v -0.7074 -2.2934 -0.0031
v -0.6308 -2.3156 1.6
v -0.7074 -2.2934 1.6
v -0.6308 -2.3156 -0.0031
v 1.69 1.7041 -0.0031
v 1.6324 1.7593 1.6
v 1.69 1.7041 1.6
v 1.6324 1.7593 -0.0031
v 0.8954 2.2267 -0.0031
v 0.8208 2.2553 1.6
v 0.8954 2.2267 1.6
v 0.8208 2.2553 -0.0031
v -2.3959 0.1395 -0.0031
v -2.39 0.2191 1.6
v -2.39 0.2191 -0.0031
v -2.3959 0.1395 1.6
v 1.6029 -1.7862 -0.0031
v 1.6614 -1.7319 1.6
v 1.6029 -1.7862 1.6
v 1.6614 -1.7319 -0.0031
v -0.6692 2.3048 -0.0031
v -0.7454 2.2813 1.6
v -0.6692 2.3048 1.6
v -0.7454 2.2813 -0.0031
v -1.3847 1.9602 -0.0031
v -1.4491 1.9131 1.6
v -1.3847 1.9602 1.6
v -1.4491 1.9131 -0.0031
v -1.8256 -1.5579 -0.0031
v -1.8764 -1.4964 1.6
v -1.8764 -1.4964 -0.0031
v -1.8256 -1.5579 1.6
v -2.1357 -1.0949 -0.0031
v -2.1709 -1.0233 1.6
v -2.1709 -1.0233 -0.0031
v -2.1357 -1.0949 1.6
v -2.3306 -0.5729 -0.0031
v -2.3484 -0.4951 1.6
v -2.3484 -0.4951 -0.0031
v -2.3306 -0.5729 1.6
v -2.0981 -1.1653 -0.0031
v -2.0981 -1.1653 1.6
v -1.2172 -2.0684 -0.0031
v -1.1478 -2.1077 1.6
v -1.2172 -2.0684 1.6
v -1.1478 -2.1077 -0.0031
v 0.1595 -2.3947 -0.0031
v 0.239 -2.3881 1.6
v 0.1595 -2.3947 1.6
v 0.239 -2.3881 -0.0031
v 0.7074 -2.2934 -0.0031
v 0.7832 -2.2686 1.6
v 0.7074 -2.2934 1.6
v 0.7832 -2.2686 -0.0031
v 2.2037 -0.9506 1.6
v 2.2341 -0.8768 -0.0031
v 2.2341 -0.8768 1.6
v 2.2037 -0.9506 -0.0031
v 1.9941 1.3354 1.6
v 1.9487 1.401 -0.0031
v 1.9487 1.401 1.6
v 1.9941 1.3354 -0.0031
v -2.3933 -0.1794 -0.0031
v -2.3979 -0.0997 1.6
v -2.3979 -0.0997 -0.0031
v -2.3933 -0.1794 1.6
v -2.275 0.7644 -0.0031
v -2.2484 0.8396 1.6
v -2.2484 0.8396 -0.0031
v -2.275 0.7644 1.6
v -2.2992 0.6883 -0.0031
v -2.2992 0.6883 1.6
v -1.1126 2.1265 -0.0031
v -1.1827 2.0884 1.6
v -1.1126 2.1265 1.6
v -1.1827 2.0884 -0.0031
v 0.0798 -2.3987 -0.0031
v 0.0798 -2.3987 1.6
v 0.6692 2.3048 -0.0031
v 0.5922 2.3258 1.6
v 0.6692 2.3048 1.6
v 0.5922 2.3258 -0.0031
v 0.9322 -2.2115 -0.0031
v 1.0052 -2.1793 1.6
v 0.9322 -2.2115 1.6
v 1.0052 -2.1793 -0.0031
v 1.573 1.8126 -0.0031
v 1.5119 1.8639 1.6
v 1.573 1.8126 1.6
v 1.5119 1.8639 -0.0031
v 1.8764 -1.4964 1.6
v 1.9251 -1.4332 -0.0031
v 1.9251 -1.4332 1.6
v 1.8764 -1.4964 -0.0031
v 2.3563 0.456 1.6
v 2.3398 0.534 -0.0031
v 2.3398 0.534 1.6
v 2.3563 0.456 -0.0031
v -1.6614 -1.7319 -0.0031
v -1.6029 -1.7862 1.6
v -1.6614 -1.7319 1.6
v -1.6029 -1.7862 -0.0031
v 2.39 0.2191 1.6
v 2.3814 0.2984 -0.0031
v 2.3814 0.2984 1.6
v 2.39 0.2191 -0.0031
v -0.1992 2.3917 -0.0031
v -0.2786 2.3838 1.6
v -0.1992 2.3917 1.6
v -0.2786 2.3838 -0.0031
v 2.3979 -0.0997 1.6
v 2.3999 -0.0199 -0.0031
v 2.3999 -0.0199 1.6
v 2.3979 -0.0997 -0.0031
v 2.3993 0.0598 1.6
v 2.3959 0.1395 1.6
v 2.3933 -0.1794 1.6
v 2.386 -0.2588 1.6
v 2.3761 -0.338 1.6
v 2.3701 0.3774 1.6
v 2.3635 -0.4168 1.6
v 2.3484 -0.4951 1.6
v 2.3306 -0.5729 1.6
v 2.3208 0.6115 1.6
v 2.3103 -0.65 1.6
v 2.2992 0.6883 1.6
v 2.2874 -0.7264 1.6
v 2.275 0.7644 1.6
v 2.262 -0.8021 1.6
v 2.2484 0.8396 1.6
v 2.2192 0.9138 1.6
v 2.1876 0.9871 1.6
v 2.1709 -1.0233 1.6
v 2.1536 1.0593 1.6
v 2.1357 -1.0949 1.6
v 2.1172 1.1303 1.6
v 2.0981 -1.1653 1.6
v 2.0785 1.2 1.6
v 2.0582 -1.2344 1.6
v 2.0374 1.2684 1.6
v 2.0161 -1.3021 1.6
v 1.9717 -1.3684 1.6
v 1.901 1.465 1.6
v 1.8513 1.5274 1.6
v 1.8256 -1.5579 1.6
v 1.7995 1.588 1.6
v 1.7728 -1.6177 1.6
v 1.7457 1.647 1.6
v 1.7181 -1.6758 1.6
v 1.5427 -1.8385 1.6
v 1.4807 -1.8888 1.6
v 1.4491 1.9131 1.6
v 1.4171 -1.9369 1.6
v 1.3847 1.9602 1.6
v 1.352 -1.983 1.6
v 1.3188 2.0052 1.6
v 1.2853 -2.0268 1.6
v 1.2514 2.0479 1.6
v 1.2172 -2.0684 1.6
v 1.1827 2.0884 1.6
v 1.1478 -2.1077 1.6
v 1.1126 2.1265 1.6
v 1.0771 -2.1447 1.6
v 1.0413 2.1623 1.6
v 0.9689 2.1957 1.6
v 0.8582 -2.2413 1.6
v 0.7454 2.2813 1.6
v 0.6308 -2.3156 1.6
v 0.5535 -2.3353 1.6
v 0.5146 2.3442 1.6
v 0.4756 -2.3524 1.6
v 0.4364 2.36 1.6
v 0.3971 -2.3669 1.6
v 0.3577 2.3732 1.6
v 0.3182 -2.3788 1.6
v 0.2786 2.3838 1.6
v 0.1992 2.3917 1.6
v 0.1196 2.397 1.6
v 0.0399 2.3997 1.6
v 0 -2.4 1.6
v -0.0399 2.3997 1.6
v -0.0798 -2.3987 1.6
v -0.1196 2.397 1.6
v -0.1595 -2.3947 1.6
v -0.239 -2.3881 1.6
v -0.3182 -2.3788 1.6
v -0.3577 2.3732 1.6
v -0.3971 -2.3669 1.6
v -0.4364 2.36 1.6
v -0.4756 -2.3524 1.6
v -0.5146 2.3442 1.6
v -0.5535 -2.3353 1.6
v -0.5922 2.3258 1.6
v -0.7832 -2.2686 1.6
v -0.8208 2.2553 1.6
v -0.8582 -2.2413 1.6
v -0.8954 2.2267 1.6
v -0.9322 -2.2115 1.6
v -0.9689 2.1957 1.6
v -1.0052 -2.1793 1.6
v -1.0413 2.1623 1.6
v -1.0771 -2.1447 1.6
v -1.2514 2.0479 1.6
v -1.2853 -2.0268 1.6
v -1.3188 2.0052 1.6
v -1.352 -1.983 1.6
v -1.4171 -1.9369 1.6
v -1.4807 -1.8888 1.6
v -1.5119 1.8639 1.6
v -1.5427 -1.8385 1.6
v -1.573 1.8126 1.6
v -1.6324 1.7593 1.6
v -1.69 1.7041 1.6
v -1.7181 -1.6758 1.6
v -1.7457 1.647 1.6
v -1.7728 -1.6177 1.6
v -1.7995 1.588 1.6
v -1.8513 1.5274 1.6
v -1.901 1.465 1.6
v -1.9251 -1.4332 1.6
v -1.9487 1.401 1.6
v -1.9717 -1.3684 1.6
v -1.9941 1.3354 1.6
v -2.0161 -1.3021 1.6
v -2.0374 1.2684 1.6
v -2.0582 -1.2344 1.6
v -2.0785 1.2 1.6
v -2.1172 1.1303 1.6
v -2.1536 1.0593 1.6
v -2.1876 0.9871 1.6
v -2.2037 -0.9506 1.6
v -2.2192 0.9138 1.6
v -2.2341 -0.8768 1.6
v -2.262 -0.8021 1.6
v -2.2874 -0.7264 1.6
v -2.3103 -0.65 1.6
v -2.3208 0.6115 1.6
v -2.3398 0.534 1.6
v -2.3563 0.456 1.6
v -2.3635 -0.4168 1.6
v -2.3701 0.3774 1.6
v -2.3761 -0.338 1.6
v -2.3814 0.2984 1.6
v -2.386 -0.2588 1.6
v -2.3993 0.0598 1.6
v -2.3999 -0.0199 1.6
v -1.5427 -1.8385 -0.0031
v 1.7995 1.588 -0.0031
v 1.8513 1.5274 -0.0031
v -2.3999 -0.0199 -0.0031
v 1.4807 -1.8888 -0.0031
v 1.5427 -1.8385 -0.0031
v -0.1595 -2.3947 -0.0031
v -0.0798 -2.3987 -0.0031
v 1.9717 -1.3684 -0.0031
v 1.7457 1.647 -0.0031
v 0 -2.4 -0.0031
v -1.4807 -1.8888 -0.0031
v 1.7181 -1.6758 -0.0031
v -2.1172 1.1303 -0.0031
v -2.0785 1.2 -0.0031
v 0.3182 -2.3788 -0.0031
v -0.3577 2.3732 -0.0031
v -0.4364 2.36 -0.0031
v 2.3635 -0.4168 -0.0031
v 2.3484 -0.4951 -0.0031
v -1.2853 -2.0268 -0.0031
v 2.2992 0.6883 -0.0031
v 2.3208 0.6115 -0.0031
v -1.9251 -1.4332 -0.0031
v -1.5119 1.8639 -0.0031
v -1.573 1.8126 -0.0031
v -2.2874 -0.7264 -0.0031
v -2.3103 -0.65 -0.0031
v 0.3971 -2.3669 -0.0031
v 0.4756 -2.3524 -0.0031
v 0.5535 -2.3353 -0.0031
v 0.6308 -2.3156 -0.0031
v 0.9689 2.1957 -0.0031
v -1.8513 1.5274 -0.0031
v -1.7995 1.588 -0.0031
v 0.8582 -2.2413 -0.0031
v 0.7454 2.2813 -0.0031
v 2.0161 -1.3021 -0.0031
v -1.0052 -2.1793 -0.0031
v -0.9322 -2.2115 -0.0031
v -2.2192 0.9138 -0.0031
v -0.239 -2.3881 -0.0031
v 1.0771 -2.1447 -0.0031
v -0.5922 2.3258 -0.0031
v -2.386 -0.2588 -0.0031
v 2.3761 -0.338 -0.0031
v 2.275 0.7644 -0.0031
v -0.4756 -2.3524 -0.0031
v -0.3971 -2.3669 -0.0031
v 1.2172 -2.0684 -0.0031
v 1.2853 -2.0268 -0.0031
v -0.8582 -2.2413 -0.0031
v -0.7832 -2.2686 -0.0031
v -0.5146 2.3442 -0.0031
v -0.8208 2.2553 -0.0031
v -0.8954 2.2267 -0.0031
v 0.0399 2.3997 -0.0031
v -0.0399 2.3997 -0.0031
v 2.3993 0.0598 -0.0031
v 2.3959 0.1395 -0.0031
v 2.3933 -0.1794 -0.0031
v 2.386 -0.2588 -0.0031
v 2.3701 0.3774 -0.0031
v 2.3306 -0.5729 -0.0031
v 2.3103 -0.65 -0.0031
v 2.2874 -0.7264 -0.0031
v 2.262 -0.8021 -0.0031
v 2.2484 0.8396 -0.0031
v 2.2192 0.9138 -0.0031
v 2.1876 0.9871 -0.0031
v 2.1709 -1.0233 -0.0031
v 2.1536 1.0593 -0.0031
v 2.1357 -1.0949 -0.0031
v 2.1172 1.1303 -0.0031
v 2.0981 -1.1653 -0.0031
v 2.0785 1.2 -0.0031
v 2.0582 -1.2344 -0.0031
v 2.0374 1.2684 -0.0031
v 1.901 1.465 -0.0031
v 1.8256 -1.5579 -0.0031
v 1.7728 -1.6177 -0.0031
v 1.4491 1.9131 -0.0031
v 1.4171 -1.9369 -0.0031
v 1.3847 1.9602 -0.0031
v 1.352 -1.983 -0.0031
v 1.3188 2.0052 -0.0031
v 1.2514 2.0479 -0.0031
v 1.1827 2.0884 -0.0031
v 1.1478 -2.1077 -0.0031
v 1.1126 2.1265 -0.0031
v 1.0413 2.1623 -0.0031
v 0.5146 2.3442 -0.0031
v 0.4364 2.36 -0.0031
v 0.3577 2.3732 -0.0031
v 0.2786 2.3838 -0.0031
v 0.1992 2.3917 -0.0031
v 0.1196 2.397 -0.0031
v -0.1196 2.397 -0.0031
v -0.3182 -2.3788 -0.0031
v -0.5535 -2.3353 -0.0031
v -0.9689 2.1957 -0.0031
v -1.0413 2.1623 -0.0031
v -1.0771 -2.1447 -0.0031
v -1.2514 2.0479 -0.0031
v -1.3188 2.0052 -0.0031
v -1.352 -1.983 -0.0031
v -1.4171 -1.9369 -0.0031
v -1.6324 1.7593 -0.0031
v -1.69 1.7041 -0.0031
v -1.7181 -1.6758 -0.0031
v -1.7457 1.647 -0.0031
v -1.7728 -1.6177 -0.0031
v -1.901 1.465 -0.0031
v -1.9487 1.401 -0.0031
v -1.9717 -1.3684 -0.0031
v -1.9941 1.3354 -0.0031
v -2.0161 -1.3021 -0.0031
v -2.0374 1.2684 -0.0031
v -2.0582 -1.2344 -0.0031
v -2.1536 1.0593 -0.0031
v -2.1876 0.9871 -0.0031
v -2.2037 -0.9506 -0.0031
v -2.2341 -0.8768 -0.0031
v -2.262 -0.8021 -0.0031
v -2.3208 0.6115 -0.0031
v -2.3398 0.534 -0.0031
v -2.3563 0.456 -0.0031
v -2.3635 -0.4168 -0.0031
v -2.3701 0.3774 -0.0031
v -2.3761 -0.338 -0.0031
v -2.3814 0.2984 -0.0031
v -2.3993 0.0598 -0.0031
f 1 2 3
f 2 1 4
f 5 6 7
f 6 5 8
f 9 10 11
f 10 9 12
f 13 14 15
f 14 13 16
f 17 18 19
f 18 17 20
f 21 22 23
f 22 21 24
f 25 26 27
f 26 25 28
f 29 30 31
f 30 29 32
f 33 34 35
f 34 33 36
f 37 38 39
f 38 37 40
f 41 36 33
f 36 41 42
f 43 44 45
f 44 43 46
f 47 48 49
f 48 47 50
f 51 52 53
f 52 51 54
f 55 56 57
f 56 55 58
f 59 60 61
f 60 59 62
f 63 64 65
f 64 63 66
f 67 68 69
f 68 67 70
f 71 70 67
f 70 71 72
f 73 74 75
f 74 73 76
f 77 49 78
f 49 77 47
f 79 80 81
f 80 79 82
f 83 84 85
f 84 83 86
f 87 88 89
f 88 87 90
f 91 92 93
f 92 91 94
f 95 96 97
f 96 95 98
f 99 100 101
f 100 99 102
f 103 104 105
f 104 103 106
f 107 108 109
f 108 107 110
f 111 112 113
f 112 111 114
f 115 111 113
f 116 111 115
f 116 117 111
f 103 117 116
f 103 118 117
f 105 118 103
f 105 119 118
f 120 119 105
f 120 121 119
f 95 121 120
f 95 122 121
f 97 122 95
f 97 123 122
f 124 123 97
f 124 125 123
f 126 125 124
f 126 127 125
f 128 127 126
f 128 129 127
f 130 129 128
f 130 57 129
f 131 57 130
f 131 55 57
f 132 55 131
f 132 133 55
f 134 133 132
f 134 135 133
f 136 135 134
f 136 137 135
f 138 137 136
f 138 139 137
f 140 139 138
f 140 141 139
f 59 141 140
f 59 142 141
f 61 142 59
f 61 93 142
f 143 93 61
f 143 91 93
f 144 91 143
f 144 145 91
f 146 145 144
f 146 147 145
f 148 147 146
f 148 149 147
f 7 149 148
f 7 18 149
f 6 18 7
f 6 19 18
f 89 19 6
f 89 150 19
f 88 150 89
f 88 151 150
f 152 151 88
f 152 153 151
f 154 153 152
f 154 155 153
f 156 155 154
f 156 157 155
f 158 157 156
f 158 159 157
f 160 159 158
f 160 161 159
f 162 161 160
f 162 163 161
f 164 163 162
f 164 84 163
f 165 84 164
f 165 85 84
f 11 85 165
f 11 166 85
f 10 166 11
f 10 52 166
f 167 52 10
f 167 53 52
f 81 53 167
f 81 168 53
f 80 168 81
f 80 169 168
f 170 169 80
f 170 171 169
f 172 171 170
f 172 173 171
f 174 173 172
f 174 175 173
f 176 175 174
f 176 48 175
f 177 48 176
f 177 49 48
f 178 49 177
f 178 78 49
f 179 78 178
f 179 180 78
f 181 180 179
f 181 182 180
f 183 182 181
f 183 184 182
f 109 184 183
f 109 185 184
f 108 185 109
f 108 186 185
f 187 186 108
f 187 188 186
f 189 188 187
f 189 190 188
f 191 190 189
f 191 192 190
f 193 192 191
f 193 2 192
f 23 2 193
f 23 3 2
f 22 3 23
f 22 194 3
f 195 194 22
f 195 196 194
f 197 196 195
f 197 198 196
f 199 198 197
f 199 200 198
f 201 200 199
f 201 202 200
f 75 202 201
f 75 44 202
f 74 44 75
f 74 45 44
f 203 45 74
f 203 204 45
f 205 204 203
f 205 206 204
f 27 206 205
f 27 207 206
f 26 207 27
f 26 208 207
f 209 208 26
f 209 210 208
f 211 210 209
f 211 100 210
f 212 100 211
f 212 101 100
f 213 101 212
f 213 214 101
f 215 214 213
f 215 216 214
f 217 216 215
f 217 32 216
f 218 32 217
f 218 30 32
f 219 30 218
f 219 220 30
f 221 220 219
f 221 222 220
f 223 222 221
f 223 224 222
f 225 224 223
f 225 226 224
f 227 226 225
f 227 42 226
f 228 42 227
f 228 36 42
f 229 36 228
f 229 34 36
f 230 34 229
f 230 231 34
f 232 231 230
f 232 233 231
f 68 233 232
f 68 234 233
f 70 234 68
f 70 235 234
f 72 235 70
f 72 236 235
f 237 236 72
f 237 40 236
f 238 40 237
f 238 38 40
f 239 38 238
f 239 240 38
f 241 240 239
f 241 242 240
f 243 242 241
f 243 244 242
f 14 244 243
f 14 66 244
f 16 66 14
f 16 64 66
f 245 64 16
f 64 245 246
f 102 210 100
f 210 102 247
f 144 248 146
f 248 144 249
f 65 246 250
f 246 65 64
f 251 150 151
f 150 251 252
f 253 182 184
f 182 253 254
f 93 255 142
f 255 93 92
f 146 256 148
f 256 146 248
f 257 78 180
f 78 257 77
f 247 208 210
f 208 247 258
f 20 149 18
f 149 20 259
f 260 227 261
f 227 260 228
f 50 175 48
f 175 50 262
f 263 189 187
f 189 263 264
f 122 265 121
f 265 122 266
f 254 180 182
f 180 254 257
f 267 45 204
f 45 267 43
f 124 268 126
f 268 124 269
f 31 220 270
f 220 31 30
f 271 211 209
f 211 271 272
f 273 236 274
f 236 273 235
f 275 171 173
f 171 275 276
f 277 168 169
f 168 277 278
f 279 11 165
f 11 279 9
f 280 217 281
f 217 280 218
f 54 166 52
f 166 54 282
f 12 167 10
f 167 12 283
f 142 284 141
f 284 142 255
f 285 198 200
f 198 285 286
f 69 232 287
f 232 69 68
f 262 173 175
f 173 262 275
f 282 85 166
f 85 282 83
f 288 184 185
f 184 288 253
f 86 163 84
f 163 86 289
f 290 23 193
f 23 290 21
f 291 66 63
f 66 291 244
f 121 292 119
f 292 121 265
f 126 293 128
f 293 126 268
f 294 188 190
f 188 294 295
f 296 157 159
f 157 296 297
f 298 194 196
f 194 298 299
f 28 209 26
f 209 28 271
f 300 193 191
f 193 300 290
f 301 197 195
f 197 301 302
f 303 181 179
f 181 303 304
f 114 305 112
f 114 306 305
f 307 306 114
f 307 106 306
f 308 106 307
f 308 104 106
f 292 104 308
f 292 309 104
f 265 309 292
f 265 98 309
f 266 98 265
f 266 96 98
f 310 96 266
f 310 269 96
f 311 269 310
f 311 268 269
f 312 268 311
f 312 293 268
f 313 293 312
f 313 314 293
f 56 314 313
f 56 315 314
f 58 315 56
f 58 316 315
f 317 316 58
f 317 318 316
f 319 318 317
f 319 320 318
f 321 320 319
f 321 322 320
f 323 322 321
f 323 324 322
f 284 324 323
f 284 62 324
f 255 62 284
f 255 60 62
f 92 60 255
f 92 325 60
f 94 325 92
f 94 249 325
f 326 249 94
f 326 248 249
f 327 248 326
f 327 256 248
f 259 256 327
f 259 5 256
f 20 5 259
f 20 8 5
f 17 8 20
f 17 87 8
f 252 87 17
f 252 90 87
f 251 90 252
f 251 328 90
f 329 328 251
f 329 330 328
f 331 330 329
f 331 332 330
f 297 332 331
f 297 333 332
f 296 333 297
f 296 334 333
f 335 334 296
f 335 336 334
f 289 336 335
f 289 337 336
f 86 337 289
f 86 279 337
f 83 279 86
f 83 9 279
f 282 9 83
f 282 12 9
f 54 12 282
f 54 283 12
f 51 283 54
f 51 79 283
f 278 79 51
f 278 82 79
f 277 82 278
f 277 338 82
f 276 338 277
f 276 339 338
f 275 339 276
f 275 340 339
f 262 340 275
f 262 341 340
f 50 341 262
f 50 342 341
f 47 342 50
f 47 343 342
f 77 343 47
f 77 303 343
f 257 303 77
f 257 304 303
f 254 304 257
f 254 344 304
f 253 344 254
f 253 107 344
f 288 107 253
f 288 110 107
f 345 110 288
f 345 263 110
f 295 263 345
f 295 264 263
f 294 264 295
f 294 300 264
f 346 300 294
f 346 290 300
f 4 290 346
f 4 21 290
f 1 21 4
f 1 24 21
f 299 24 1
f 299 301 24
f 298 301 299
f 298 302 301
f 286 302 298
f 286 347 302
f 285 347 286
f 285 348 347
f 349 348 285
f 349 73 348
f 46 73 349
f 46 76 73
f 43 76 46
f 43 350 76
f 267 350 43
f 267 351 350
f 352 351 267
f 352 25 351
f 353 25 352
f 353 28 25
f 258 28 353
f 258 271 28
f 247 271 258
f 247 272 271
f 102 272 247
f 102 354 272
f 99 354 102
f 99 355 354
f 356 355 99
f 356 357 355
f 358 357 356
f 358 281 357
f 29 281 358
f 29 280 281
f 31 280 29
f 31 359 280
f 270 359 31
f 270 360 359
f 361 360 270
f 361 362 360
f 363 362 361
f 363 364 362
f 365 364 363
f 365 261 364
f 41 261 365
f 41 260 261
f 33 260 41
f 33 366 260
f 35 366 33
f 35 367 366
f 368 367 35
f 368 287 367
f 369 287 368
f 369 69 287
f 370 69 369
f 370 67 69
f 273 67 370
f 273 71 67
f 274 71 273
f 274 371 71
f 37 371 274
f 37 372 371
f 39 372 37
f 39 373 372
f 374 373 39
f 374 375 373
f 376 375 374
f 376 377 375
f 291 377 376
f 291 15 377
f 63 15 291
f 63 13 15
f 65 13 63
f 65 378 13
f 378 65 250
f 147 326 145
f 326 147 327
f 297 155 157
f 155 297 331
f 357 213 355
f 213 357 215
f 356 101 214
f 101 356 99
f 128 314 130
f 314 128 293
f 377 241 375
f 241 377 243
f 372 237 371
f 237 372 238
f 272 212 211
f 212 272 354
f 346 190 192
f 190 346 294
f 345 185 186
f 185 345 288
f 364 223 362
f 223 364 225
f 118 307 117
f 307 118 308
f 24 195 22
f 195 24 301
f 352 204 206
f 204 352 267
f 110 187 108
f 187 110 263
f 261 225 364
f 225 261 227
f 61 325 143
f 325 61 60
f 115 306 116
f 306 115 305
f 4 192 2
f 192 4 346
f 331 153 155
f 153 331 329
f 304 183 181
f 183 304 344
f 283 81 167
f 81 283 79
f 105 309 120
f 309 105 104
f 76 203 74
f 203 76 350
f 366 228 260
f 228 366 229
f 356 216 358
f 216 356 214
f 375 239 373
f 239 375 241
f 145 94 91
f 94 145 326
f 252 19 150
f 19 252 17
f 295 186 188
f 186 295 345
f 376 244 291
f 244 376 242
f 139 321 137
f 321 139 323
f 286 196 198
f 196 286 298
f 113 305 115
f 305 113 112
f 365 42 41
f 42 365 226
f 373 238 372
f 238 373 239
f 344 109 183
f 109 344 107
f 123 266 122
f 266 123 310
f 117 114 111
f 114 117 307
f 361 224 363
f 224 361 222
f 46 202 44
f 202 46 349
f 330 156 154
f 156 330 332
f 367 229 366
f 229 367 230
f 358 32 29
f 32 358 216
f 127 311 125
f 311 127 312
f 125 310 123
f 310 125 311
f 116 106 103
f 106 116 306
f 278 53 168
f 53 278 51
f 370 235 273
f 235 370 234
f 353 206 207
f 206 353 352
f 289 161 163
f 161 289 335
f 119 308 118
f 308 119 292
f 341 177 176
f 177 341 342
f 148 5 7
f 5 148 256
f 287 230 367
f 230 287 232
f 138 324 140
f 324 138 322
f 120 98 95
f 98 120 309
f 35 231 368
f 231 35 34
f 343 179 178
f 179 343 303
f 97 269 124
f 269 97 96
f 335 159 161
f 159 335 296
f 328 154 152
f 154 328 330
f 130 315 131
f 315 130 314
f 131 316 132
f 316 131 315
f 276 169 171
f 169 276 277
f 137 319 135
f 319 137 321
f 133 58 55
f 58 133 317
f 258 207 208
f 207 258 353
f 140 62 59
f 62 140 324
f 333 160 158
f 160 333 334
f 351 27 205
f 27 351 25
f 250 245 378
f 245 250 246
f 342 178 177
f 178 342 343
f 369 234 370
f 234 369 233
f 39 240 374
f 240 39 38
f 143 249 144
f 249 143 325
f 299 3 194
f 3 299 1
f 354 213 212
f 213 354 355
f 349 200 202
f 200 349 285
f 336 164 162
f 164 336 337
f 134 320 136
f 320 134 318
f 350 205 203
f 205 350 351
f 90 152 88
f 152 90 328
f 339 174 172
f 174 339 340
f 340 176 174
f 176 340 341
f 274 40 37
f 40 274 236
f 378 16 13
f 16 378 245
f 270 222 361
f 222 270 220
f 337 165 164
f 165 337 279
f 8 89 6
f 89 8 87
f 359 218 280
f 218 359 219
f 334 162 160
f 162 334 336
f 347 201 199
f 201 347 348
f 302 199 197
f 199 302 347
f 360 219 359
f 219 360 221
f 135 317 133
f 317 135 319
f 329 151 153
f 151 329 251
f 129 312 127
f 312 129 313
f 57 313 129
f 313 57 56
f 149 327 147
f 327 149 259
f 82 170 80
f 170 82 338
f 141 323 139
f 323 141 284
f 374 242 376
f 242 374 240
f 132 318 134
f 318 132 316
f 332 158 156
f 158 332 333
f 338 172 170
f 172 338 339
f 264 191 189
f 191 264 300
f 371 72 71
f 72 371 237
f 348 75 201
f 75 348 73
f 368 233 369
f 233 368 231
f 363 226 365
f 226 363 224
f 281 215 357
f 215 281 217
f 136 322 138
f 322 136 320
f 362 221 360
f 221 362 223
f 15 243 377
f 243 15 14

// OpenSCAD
use <../lib.scad>
use <3192.scad>
$fa=1; $fs=0.2;
function ldraw_lib__5(realsolid=false) = [
// 0 ~Moved to 3192
// 0 Name: 5.dat
// 0 Author: [PTadmin]
// 0 !LDRAW_ORG Part UPDATE 1998-06
// 0 !LICENSE Licensed under CC BY 4.0 : see CAreadme.txt
// 
// 0 BFC CERTIFY CCW
  [0,"BFC","CERTIFY"],
  [0,"BFC","CCW"],
// 
// 0 !HISTORY 1998-06-20 [PTadmin] Official Update 1998-06
// 0 !HISTORY 2007-07-09 [PTadmin] Header formatted for Contributor Agreement
// 0 !HISTORY 2008-07-01 [PTadmin] Official Update 2008-01
// 
// 
// 1 16 0 0 0 1 0 0 0 1 0 0 0 1 3192.dat
  [1,16,0,0,0,1,0,0,0,1,0,0,0,1, ldraw_lib__3192(realsolid)],
];
module ldraw_lib__5(step=0, col=false, unit=2/5, alt=false, line=0.2, solid=!$preview)
    makepoly(ldraw_lib__5(solid), step=step, col=col, unit=unit, alt=alt, line=line, solid=solid);
ldraw_lib__5(line=0.2);
